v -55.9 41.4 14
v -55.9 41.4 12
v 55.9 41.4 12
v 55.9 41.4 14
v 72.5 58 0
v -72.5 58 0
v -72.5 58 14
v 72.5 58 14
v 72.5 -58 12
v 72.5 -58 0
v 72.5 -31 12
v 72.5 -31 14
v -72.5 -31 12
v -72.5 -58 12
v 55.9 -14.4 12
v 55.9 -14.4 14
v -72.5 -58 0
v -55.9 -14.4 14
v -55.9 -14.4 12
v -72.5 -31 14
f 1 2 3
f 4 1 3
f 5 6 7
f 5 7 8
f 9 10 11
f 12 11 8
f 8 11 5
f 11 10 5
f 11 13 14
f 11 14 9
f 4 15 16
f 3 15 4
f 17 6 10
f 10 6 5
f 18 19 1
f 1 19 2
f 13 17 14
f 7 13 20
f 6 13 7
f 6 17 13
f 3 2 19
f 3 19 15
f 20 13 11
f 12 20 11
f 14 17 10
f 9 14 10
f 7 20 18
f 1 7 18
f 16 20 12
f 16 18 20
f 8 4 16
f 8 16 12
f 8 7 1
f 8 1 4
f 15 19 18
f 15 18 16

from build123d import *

# Parameters (mm, degrees)
SKETCH1_W           = 145
SKETCH1_H           = 116
BOSS_EXTRUDE1_DEPTH = 12
SKETCH2_W           = 145
SKETCH2_H           = 89
SKETCH2_W_2         = 111.8
SKETCH2_H_2         = 55.8
BOSS_EXTRUDE2_DEPTH = 2


with BuildPart() as part:
    # Sketch1 → Boss-Extrude1 (new body)
    with BuildSketch(Plane.XY):
        Rectangle(SKETCH1_W, SKETCH1_H)
    extrude(amount=BOSS_EXTRUDE1_DEPTH)

    # Sketch2 → Boss-Extrude2 (add)
    with BuildSketch(Plane.XY.offset(12)):
        with Locations((0, 13.5)):
            Rectangle(SKETCH2_W, SKETCH2_H)
        with Locations((0, 13.5)):
            Rectangle(SKETCH2_W_2, SKETCH2_H_2, mode=Mode.SUBTRACT)
    extrude(amount=BOSS_EXTRUDE2_DEPTH)


solid = part.part
